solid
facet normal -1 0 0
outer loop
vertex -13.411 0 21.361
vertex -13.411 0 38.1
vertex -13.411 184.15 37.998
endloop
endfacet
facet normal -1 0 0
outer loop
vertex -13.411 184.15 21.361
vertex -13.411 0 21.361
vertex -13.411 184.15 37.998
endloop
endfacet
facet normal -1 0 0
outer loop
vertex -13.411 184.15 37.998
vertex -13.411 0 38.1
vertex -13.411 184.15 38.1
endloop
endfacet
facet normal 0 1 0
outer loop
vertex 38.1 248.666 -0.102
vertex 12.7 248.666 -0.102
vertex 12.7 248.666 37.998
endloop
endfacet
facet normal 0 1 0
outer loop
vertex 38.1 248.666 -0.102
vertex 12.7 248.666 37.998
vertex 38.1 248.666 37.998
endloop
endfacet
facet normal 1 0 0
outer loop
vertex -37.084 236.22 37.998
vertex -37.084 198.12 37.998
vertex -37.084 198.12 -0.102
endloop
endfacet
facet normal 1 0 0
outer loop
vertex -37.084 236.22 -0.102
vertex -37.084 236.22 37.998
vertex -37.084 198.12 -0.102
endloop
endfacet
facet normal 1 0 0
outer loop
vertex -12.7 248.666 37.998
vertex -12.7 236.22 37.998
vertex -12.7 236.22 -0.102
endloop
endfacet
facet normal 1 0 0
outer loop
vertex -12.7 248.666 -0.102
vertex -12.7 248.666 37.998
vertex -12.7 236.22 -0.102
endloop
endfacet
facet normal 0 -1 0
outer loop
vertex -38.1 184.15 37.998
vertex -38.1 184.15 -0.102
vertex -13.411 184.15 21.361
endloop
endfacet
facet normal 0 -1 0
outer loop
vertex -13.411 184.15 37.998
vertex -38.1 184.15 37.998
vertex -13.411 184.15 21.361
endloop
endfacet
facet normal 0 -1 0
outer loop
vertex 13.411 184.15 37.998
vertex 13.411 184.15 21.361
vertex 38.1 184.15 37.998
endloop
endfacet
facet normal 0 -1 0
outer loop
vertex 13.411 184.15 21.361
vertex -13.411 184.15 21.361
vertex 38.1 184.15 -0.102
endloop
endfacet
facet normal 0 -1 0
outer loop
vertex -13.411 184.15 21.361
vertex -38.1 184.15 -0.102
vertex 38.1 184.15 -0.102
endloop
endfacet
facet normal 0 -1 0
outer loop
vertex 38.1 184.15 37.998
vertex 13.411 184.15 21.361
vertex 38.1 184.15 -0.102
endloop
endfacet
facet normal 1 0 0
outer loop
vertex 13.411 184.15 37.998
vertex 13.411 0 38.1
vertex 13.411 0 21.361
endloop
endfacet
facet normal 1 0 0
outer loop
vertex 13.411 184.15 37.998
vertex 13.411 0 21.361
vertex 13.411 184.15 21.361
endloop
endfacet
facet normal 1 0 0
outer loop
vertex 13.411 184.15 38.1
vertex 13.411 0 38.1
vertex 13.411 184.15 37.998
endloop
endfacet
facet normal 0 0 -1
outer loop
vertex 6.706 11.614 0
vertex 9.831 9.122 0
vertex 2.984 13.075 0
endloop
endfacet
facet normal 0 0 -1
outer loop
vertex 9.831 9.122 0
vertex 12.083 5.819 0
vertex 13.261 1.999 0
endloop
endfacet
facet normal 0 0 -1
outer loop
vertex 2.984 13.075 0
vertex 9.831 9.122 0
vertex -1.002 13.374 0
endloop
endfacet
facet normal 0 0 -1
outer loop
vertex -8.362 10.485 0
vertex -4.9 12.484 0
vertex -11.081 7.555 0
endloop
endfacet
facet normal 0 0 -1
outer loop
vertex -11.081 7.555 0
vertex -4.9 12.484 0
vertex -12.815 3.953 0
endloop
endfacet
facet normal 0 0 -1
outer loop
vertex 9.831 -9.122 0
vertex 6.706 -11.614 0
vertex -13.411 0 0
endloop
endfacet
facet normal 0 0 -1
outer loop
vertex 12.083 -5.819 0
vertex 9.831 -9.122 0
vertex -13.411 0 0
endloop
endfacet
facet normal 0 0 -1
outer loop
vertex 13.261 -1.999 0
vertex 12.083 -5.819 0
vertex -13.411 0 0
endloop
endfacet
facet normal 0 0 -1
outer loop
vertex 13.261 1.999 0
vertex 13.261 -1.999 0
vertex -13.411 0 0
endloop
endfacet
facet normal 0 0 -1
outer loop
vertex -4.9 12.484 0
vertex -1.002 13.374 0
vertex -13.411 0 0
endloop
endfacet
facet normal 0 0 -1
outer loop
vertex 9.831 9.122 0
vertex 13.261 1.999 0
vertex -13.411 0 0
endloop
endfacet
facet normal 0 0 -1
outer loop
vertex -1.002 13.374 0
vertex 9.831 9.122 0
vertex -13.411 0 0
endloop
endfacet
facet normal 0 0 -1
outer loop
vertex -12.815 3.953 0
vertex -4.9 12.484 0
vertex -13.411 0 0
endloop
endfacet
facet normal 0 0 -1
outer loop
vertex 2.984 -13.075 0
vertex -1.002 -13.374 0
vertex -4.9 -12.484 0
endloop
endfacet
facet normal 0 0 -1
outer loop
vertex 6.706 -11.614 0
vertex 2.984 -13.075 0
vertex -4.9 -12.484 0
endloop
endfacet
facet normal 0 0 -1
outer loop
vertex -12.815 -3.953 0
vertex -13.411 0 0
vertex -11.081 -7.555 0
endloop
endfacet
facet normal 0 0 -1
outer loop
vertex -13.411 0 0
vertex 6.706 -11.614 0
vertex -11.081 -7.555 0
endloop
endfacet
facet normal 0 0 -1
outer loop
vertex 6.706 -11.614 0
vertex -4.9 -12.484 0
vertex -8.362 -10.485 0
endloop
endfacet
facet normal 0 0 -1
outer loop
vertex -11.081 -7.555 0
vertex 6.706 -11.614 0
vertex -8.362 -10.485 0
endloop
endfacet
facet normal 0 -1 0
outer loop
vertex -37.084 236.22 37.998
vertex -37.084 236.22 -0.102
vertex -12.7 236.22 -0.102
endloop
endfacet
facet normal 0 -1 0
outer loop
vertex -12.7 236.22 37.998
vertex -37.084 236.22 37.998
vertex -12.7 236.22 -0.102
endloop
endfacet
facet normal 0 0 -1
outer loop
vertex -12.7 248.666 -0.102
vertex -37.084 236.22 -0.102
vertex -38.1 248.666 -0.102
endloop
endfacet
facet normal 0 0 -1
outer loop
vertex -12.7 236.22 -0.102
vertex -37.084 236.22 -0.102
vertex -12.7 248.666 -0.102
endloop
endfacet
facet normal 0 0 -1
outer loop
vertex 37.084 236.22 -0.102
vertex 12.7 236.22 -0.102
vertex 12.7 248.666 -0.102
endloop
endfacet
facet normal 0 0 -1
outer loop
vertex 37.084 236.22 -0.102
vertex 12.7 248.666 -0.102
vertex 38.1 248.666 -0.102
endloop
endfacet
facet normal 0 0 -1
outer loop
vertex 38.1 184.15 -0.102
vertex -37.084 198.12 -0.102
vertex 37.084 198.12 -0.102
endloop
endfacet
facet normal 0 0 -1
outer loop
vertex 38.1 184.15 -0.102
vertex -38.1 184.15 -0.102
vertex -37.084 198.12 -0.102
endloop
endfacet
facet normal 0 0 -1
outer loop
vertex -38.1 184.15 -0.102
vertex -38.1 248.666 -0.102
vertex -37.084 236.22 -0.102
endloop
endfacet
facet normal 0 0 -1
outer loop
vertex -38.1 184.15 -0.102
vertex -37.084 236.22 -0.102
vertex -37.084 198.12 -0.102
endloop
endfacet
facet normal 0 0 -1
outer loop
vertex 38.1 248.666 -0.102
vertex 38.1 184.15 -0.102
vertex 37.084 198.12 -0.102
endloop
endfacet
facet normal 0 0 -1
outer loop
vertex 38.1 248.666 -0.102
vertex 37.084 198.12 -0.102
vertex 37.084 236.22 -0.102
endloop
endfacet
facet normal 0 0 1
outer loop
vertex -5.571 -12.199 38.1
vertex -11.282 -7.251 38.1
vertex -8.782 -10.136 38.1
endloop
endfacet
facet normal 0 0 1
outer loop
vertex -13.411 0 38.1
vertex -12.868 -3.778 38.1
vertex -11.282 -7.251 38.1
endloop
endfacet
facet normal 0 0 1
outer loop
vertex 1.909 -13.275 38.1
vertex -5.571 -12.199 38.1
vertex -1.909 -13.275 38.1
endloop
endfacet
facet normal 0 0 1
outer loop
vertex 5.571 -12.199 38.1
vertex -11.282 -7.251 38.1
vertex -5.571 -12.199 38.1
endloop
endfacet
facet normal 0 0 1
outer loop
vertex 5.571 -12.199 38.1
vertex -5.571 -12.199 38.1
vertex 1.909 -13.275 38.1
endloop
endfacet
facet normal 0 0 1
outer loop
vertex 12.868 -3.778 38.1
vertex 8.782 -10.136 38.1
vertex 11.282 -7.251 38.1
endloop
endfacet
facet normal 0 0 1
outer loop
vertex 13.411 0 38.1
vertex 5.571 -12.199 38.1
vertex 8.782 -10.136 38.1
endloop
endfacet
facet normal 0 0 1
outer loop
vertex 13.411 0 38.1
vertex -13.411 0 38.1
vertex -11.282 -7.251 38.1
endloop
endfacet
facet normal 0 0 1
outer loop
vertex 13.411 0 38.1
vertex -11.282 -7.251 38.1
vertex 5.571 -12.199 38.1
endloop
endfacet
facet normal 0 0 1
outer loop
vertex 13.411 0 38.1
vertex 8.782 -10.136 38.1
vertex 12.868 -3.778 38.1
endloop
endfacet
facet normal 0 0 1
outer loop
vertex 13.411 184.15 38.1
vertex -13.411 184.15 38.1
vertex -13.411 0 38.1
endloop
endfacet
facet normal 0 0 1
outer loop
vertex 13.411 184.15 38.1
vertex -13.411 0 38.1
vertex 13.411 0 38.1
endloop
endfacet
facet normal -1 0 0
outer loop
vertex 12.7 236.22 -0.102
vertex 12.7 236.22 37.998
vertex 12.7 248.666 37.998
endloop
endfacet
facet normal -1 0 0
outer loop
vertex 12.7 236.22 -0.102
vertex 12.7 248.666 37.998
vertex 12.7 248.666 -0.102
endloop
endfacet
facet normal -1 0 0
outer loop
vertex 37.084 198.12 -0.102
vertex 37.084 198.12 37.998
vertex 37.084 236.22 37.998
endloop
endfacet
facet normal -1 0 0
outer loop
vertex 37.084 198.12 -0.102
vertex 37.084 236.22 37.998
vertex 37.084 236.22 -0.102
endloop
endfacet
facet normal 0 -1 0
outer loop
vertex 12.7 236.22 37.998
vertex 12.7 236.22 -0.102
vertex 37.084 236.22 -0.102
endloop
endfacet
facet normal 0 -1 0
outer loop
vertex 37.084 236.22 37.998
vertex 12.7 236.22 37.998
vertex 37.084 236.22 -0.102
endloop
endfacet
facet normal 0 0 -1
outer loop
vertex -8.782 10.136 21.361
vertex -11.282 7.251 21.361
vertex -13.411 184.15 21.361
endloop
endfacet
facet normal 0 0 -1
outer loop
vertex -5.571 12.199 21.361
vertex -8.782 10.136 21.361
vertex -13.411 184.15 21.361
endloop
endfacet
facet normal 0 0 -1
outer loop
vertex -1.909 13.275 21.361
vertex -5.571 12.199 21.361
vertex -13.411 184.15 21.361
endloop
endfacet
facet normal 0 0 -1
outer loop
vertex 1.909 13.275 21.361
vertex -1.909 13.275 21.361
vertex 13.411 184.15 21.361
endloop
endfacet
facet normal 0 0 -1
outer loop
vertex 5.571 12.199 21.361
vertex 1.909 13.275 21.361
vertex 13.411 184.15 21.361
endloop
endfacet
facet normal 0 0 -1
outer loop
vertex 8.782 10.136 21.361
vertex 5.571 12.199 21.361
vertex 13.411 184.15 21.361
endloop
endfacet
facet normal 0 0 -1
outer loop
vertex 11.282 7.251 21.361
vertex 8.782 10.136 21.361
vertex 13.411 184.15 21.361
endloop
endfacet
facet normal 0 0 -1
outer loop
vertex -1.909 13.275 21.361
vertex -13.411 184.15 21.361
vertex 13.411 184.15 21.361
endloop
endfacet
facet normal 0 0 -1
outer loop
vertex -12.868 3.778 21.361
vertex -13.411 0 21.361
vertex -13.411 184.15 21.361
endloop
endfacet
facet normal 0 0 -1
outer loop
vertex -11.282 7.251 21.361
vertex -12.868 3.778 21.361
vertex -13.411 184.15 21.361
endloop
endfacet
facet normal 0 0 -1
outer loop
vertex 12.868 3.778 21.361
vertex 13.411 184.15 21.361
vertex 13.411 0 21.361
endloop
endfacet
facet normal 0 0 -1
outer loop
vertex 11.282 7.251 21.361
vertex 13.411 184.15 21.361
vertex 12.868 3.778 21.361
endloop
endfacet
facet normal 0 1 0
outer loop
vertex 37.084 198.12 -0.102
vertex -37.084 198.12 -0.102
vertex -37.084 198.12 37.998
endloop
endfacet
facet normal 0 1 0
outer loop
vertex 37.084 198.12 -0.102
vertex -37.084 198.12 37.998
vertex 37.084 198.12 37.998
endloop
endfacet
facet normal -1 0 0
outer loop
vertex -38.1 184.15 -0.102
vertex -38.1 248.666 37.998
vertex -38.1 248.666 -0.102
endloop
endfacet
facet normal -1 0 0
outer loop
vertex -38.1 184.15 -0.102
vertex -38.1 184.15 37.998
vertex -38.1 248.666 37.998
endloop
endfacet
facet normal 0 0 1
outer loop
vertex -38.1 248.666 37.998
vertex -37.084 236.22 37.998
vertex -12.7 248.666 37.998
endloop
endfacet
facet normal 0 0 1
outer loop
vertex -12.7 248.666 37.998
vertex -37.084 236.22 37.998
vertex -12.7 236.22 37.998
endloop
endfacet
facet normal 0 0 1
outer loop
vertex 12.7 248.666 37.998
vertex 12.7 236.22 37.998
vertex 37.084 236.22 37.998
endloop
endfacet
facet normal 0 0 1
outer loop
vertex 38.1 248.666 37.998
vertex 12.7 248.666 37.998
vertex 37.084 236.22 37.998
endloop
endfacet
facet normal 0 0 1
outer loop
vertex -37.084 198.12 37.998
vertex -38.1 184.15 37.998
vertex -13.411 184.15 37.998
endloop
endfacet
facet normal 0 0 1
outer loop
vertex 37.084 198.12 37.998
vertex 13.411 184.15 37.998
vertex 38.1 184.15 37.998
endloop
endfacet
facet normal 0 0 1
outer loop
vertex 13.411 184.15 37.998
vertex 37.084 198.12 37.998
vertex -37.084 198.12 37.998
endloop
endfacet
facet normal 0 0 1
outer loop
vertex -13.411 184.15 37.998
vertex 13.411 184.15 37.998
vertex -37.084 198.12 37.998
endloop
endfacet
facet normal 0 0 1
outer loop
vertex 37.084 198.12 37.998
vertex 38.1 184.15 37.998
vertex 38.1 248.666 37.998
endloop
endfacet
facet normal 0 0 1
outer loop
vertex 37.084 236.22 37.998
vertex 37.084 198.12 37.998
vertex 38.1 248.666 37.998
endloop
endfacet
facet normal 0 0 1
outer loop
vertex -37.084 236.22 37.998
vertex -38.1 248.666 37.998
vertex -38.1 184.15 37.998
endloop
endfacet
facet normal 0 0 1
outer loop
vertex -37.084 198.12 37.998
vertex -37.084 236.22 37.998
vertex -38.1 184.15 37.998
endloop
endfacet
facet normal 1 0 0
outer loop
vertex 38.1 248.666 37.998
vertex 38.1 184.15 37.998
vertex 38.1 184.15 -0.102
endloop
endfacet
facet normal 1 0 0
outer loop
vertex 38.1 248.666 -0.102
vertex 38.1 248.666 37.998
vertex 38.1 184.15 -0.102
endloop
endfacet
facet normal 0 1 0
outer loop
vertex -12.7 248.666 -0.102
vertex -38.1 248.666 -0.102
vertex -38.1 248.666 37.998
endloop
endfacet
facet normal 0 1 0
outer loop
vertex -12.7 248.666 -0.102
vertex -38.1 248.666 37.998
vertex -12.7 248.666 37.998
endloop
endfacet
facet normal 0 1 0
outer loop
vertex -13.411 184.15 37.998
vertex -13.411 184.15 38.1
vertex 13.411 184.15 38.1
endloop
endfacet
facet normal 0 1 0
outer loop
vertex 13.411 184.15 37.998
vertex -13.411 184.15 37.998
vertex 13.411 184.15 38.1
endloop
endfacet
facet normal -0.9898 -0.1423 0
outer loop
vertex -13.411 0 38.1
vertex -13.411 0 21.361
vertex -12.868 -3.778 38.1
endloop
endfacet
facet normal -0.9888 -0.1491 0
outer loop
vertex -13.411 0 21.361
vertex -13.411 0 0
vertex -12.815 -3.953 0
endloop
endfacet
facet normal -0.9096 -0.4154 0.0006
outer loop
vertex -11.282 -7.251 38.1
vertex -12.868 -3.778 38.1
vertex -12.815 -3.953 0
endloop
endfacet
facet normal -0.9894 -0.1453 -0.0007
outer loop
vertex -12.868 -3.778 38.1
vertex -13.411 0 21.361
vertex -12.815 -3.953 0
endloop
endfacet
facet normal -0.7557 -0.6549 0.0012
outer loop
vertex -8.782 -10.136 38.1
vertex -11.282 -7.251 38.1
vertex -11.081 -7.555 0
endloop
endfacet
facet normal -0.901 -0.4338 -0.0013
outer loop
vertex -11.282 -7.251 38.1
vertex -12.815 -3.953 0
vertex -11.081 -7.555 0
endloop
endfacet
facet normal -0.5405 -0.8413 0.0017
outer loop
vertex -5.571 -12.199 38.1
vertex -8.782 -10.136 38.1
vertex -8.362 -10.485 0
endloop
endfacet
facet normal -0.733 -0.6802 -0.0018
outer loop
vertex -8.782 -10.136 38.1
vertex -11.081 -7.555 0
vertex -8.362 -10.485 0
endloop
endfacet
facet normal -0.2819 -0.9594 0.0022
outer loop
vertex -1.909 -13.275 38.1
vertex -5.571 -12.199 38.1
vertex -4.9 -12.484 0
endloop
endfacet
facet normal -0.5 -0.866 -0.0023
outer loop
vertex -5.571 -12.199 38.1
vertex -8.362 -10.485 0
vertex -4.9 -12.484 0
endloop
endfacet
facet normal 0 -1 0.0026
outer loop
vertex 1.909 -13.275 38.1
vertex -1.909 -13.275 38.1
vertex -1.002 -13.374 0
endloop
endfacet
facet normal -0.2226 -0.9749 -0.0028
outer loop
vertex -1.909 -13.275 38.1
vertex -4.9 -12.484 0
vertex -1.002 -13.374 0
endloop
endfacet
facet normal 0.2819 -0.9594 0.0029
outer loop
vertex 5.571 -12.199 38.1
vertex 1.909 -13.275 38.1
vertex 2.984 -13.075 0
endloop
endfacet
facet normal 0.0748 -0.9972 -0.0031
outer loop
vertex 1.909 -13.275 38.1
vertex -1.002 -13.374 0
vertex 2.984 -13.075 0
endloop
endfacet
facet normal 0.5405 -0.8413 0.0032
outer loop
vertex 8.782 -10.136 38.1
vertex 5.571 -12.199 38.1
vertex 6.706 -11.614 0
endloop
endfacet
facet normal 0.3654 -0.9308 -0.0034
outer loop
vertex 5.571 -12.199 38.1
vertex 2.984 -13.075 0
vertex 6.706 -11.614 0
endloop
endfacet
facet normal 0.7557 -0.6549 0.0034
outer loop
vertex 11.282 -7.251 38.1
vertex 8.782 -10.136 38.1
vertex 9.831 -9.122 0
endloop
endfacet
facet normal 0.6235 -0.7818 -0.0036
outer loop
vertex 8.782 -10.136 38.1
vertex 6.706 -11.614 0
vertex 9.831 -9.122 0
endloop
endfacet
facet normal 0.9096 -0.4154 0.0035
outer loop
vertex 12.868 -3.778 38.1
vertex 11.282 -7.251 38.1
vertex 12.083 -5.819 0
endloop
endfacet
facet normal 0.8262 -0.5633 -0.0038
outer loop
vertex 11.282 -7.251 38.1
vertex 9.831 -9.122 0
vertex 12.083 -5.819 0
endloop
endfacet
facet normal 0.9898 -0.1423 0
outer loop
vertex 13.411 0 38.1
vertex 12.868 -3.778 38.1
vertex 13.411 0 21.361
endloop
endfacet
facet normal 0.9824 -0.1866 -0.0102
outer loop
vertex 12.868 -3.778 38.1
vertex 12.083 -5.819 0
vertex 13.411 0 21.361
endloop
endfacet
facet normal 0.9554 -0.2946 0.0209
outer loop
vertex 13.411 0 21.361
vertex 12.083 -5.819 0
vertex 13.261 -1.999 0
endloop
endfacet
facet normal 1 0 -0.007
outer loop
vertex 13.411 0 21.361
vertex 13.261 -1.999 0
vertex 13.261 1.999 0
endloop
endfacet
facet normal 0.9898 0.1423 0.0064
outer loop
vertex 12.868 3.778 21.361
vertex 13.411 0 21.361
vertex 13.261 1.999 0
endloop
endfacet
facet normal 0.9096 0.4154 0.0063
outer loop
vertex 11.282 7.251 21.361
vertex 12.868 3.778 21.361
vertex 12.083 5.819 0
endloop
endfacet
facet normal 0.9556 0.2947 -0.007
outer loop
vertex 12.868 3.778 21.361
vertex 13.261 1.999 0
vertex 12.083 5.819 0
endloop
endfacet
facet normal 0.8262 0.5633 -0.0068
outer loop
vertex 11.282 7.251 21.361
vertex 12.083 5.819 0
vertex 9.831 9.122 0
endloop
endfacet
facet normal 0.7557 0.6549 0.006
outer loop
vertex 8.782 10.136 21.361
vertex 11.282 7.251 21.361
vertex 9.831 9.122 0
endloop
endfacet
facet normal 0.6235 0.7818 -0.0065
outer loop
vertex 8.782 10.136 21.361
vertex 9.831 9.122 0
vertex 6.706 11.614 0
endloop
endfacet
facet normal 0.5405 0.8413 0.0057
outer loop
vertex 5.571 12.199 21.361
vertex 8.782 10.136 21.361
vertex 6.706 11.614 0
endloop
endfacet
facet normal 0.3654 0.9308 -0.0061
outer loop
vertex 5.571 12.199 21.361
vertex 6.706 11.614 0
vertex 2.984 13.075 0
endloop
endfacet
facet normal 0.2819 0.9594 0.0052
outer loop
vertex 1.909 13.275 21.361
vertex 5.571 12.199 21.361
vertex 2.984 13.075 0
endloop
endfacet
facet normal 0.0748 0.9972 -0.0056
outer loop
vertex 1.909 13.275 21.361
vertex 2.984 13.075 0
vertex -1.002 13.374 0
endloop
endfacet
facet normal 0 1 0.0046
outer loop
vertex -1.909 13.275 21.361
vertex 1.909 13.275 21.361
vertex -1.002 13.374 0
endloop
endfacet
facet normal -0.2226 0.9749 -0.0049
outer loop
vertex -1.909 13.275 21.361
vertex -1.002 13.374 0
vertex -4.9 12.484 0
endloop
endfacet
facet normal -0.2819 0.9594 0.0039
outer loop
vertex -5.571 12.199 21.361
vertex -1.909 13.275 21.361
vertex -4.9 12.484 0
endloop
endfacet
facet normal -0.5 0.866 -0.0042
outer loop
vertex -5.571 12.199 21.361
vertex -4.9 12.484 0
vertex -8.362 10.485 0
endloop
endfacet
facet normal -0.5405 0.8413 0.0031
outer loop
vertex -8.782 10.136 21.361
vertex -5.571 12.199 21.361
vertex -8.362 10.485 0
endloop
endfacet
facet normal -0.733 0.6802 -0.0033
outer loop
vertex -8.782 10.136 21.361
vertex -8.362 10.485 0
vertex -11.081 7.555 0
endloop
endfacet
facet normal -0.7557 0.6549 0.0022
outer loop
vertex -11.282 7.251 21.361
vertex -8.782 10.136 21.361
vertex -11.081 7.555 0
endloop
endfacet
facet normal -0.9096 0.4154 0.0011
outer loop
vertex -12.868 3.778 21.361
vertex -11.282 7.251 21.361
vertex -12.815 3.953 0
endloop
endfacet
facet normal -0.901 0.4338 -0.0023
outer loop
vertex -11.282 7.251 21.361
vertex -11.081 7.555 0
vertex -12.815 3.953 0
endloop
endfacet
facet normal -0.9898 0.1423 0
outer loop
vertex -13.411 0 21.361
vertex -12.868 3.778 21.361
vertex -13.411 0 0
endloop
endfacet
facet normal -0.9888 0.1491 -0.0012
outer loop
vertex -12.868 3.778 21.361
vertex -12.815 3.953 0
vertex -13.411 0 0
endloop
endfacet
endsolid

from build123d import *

# Parameters (mm, degrees)
SKETCH2_R           = 13.4112
BOSS_EXTRUDE1_DEPTH = 38.1
SKETCH5_W           = 26.8224
SKETCH5_H           = 184.15
BOSS_EXTRUDE2_DEPTH = 16.7386
SKETCH8_W           = 76.2
SKETCH8_H           = 38.1
BOSS_EXTRUDE3_DEPTH = 13.97
SKETCH9_W           = 1.016
SKETCH9_H           = 38.1
BOSS_EXTRUDE4_DEPTH = 38.1
SKETCH10_W          = 25.4
SKETCH10_H          = 38.1
BOSS_EXTRUDE5_DEPTH = 12.446


with BuildPart() as part:
    # Sketch2 → Boss-Extrude1 (new body)
    with BuildSketch(Plane.XY):
        with Locations(Location((0, 0, 0), (0, 0, 180))):
            Circle(SKETCH2_R)
    extrude(amount=BOSS_EXTRUDE1_DEPTH)

    # Sketch5 → Boss-Extrude2 (add)
    with BuildSketch(Plane.XY.offset(38.1)):
        with Locations((0, 92.075)):
            Rectangle(SKETCH5_W, SKETCH5_H)
    extrude(amount=-BOSS_EXTRUDE2_DEPTH)

    # Sketch8 → Boss-Extrude3 (add)
    with BuildSketch(Plane(origin=(0, 184.15, 0), x_dir=(1, 0, 0), z_dir=(0, 1, 0))):
        with Locations((0, -18.948214994)):
            Rectangle(SKETCH8_W, SKETCH8_H)
    extrude(amount=BOSS_EXTRUDE3_DEPTH)

    # Sketch9 → Boss-Extrude4 (add)
    with BuildSketch(Plane(origin=(0, 198.12, 0), x_dir=(1, 0, 0), z_dir=(0, 1, 0))):
        with Locations((-37.592, -18.948214994)):
            Rectangle(SKETCH9_W, SKETCH9_H)
        with Locations((37.592, -18.948214994)):
            Rectangle(SKETCH9_W, SKETCH9_H)
    extrude(amount=BOSS_EXTRUDE4_DEPTH)

    # Sketch10 → Boss-Extrude5 (add)
    with BuildSketch(Plane(origin=(0, 236.22, 0), x_dir=(1, 0, 0), z_dir=(0, 1, 0))):
        with Locations((-25.4, -18.948214994)):
            Rectangle(SKETCH10_W, SKETCH10_H)
        with Locations((25.4, -18.948214994)):
            Rectangle(SKETCH10_W, SKETCH10_H)
    extrude(amount=BOSS_EXTRUDE5_DEPTH)


solid = part.part
